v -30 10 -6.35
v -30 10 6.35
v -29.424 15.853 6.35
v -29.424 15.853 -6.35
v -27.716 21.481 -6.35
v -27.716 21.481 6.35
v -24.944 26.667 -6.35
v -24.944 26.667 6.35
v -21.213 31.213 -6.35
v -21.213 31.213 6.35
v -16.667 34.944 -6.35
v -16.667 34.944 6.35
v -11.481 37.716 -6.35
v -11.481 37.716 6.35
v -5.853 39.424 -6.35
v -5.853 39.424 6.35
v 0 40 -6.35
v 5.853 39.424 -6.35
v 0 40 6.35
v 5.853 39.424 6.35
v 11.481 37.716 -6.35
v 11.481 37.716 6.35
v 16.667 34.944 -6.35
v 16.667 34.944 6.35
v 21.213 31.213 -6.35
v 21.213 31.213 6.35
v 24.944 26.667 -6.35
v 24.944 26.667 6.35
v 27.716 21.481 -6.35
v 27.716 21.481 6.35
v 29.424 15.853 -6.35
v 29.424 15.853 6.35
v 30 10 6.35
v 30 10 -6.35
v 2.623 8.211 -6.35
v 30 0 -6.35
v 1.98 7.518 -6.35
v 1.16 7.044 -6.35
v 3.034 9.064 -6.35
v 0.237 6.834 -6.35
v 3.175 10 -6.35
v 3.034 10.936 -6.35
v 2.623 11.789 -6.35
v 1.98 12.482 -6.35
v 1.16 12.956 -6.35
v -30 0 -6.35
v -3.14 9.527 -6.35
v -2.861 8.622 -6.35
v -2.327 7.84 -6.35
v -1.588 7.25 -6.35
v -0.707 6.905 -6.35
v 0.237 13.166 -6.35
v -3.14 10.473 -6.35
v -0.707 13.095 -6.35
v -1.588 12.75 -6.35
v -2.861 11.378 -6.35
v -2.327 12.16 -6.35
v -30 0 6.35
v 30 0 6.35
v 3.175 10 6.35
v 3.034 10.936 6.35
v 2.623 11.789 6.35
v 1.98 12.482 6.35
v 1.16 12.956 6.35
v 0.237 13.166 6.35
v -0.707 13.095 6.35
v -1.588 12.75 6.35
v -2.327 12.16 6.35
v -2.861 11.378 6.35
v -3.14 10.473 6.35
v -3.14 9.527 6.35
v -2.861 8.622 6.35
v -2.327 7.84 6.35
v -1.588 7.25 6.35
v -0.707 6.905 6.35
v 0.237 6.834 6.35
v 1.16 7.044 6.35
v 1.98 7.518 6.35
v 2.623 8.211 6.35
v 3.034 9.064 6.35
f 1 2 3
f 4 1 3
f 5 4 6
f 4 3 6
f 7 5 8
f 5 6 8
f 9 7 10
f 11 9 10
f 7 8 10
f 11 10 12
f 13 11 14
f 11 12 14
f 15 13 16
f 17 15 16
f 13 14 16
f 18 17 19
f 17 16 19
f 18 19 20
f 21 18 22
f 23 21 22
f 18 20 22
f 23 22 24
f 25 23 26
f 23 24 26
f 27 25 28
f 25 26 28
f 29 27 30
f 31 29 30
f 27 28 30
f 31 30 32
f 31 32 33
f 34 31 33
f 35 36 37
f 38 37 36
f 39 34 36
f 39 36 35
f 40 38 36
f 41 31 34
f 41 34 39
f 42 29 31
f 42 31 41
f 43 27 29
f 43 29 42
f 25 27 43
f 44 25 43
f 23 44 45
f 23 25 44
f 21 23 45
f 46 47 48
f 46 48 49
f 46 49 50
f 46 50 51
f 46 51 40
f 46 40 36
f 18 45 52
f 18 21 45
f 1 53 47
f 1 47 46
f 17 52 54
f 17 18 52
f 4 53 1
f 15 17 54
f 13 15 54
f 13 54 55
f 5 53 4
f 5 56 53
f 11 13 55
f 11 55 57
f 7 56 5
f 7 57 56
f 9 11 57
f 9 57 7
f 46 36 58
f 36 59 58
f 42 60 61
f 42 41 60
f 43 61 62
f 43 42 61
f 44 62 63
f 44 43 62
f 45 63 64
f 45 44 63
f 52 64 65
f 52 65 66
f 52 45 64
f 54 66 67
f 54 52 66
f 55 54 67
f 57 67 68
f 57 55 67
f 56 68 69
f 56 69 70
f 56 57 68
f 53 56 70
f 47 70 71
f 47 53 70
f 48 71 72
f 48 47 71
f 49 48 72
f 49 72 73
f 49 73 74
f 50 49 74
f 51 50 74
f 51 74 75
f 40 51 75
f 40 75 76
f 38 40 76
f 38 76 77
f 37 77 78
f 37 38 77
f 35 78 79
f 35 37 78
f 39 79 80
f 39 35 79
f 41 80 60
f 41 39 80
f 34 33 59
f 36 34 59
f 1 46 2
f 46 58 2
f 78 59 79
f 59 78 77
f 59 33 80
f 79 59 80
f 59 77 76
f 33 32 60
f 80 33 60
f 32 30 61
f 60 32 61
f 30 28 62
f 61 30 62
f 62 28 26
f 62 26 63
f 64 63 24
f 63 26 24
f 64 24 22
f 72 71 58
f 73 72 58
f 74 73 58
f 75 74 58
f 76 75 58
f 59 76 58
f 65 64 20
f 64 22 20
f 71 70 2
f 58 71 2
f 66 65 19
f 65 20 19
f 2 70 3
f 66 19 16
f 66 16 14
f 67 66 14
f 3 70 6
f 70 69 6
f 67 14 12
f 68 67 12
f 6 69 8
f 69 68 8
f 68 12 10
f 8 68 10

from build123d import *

# Parameters (mm, degrees)
CROQUIS1_R              = 3.175
SALIENTE_EXTRUIR1_DEPTH = 6.35


with BuildPart() as part:
    # Croquis1 → Saliente-Extruir1 (new, symmetric)
    with BuildSketch(Plane.XY):
        with BuildLine():
            Line((30, 10), (30, 0))
            Line((30, 0), (-30, 0))
            Line((-30, 0), (-30, 10))
            ThreePointArc((-30, 10), (0, 40), (30, 10))
        make_face()
        with Locations((0, 10)):
            Circle(CROQUIS1_R, mode=Mode.SUBTRACT)
    extrude(amount=SALIENTE_EXTRUIR1_DEPTH, both=True)


solid = part.part
